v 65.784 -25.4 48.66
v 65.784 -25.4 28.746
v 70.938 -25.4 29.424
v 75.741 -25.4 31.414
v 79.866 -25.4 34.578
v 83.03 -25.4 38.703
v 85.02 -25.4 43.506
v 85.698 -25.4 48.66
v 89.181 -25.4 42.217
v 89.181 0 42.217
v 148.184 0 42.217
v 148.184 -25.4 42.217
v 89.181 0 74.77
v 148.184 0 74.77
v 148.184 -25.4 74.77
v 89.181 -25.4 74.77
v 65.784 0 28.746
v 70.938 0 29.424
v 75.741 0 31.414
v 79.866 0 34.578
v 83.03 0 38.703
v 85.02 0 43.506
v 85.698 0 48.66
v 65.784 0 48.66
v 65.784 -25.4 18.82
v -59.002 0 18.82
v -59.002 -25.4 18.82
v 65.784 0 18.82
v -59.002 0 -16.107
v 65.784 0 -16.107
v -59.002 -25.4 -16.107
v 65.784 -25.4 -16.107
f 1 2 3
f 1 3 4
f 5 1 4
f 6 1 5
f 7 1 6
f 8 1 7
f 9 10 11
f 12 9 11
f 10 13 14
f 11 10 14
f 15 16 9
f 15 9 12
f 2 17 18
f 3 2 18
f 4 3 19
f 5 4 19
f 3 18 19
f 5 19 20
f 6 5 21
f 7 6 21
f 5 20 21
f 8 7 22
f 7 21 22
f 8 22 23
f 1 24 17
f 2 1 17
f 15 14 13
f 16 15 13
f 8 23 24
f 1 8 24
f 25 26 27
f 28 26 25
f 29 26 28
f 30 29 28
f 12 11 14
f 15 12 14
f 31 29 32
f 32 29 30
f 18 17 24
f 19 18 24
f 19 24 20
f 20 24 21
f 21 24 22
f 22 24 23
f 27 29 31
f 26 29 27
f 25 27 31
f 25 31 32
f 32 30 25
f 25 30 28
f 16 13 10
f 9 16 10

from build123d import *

# Parameters (mm, degrees)
F0_W     = 124.786276
F0_H     = 34.926591
F1_DEPTH = 25.4


with BuildPart() as f1:
    # F0 (on Front) → F1 (new body)
    with BuildSketch(Plane.XZ):
        Polygon((89.181498, 74.770041), (89.181498, 48.659865), (89.181498, 42.217098), (148.183689, 42.217098), (148.183689, 74.770041), align=None)
        with BuildLine():
            Line((65.784067, 48.659865), (65.784067, 28.745541))
            ThreePointArc((65.784067, 28.745541), (79.86562, 34.578311), (85.698391, 48.659865))
            Line((85.698391, 48.659865), (65.784067, 48.659865))
        make_face()
        with Locations((3.390929, 1.356376)):
            Rectangle(F0_W, F0_H)
    extrude(amount=F1_DEPTH)


solid = f1.part
